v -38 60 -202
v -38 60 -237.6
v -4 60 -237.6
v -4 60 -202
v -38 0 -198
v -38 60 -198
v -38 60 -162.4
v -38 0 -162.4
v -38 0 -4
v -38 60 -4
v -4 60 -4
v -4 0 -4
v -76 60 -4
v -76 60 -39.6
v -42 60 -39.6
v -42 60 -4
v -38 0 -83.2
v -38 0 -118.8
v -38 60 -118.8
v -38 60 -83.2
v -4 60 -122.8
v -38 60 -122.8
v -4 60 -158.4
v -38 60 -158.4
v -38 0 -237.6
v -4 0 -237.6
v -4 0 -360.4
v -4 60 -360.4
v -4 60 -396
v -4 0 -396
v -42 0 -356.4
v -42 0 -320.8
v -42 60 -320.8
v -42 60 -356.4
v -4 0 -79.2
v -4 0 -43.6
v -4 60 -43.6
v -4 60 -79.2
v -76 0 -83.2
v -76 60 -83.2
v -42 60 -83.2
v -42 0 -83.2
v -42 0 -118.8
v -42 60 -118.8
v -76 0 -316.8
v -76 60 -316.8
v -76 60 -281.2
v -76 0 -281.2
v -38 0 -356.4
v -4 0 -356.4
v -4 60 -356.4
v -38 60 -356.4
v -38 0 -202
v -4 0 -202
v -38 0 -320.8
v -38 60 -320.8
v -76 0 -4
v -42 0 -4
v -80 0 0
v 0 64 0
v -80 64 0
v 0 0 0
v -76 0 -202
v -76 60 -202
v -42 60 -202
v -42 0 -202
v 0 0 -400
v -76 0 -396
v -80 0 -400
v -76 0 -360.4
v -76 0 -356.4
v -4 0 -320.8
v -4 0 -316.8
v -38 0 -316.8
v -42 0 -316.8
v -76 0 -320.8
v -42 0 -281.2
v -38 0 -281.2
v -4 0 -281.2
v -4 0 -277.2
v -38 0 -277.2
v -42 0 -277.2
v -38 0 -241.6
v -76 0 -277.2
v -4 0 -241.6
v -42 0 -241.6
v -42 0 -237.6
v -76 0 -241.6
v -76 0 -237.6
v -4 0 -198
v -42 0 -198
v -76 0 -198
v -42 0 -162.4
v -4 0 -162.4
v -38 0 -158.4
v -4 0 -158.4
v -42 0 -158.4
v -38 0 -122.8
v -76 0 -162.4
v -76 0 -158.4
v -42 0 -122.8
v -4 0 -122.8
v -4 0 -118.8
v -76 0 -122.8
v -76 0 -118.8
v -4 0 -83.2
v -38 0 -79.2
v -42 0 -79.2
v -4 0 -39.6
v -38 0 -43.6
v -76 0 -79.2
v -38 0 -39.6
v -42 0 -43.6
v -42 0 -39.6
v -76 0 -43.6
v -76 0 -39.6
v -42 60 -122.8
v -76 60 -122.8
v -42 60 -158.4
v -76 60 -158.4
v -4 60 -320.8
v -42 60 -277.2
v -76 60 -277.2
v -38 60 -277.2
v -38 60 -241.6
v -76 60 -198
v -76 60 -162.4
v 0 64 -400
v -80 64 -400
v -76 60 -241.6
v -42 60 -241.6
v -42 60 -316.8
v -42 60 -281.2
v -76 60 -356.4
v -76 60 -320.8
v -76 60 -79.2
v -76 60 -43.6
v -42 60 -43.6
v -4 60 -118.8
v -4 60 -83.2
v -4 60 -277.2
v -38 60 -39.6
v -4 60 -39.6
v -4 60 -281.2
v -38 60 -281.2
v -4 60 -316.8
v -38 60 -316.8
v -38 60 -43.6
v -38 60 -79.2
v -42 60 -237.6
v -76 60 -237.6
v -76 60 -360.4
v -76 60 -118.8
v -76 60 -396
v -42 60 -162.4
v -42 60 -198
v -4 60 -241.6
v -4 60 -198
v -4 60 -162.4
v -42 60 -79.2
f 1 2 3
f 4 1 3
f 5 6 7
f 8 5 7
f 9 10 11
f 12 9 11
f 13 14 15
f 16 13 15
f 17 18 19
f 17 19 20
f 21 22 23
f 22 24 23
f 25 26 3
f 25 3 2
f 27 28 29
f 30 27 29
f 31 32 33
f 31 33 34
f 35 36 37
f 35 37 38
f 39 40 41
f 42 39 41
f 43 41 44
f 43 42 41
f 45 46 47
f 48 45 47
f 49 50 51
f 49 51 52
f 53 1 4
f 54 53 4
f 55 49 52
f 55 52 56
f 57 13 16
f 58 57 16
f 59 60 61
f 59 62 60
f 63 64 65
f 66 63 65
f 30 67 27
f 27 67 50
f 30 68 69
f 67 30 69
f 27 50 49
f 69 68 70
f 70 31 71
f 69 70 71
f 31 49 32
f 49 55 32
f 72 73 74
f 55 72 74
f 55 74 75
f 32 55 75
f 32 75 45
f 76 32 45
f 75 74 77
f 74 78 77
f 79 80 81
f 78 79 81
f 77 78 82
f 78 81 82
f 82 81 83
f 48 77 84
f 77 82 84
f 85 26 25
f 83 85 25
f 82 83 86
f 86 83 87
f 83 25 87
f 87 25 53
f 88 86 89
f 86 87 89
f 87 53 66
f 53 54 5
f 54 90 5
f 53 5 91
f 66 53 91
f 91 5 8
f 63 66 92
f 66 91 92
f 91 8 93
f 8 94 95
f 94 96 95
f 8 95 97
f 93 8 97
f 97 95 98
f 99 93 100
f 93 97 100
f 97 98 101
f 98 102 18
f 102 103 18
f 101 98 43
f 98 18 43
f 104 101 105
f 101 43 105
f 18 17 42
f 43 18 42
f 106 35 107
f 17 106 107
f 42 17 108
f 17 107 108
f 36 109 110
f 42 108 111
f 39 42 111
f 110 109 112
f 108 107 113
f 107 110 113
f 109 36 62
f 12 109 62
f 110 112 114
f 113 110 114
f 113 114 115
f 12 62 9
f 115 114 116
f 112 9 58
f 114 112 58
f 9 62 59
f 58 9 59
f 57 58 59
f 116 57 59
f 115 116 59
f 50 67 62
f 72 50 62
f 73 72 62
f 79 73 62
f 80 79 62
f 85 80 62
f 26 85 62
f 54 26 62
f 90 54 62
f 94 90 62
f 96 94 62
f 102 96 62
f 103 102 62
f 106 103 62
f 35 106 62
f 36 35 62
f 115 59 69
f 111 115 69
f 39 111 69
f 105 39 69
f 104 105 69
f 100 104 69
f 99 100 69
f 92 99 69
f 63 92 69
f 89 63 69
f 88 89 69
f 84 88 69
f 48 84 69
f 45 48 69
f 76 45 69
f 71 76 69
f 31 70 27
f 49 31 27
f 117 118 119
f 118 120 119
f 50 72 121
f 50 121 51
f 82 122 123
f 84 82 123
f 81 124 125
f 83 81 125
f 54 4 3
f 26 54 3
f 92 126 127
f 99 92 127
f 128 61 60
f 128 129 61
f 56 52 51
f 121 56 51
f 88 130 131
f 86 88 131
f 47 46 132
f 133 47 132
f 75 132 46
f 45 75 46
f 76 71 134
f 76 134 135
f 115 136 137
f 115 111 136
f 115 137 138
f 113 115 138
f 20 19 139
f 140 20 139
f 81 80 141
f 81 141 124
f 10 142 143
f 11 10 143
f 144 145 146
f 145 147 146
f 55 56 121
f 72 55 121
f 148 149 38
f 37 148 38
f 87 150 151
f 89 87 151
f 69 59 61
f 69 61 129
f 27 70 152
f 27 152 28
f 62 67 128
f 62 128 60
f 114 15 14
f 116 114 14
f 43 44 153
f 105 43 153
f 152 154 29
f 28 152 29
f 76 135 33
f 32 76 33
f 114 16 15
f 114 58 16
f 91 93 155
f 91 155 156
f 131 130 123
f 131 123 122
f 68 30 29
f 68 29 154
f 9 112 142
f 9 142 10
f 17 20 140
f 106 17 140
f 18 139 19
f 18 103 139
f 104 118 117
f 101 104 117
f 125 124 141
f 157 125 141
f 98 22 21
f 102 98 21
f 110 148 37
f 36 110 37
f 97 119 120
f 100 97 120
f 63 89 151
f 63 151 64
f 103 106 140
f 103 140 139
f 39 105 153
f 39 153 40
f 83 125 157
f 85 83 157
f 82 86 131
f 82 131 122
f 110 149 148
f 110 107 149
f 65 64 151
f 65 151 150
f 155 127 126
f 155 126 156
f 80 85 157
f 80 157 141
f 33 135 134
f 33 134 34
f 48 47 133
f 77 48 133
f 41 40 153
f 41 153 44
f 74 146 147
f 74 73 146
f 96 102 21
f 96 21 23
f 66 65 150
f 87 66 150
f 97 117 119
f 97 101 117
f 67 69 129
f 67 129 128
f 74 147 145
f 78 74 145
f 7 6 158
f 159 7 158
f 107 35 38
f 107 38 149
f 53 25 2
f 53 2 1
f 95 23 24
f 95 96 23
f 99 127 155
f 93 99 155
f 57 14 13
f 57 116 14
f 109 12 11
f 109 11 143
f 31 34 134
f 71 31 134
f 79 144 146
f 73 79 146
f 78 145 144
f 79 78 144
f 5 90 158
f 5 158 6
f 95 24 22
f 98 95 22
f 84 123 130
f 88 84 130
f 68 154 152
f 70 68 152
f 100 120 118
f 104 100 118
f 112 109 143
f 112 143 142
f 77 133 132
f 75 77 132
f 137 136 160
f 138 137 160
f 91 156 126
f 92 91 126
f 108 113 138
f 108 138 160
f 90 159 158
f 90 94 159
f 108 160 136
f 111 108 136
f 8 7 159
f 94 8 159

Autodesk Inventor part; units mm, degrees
ref_plane "YZ Plane" through (0, 0, 0) normal (1, 0, 0) x (0, 1, 0)
ref_plane "XZ Plane" through (0, 0, 0) normal (0, 1, 0) x (-1, 0, 0)
ref_plane "XY Plane" through (0, 0, 0) normal (0, 0, 1) x (1, 0, 0)
sketch "Sketch1" plane through (0, 0, 0) normal (0, 1, 0) x (-1, 0, 0)
  line L0 (0, 0) -> (80, 0)
  line L1 (80, 0) -> (80, -400)
  line L2 (80, -400) -> (0, -400)
  line L3 (0, -400) -> (0, 0)
  line L4 (76, -4) -> (42, -4)
  line L5 (42, -4) -> (42, -39.6)
  line L6 (42, -39.6) -> (76, -39.6)
  line L7 (76, -39.6) -> (76, -4)
  line L8 (76, -43.6) -> (42, -43.6)
  line L9 (42, -43.6) -> (42, -79.2)
  line L10 (42, -79.2) -> (76, -79.2)
  line L11 (76, -79.2) -> (76, -43.6)
  line L12 (76, -83.2) -> (42, -83.2)
  line L13 (42, -83.2) -> (42, -118.8)
  line L14 (42, -118.8) -> (76, -118.8)
  line L15 (76, -118.8) -> (76, -83.2)
  line L16 (76, -122.8) -> (42, -122.8)
  line L17 (42, -122.8) -> (42, -158.4)
  line L18 (42, -158.4) -> (76, -158.4)
  line L19 (76, -158.4) -> (76, -122.8)
  line L20 (76, -162.4) -> (42, -162.4)
  line L21 (42, -162.4) -> (42, -198)
  line L22 (42, -198) -> (76, -198)
  line L23 (76, -198) -> (76, -162.4)
  line L24 (76, -202) -> (42, -202)
  line L25 (42, -202) -> (42, -237.6)
  line L26 (42, -237.6) -> (76, -237.6)
  line L27 (76, -237.6) -> (76, -202)
  line L28 (76, -241.6) -> (42, -241.6)
  line L29 (42, -241.6) -> (42, -277.2)
  line L30 (42, -277.2) -> (76, -277.2)
  line L31 (76, -277.2) -> (76, -241.6)
  line L32 (76, -281.2) -> (42, -281.2)
  line L33 (42, -281.2) -> (42, -316.8)
  line L34 (42, -316.8) -> (76, -316.8)
  line L35 (76, -316.8) -> (76, -281.2)
  line L36 (76, -320.8) -> (42, -320.8)
  line L37 (42, -320.8) -> (42, -356.4)
  line L38 (42, -356.4) -> (76, -356.4)
  line L39 (76, -356.4) -> (76, -320.8)
  line L40 (38, -4) -> (4, -4)
  line L41 (4, -4) -> (4, -39.6)
  line L42 (4, -39.6) -> (38, -39.6)
  line L43 (38, -39.6) -> (38, -4)
  line L44 (38, -43.6) -> (4, -43.6)
  line L45 (4, -43.6) -> (4, -79.2)
  line L46 (4, -79.2) -> (38, -79.2)
  line L47 (38, -79.2) -> (38, -43.6)
  line L48 (38, -83.2) -> (4, -83.2)
  line L49 (4, -83.2) -> (4, -118.8)
  line L50 (4, -118.8) -> (38, -118.8)
  line L51 (38, -118.8) -> (38, -83.2)
  line L52 (38, -122.8) -> (4, -122.8)
  line L53 (4, -122.8) -> (4, -158.4)
  line L54 (4, -158.4) -> (38, -158.4)
  line L55 (38, -158.4) -> (38, -122.8)
  line L56 (38, -162.4) -> (4, -162.4)
  line L57 (4, -162.4) -> (4, -198)
  line L58 (4, -198) -> (38, -198)
  line L59 (38, -198) -> (38, -162.4)
  line L60 (38, -202) -> (4, -202)
  line L61 (4, -202) -> (4, -237.6)
  line L62 (4, -237.6) -> (38, -237.6)
  line L63 (38, -237.6) -> (38, -202)
  line L64 (38, -241.6) -> (4, -241.6)
  line L65 (4, -241.6) -> (4, -277.2)
  line L66 (4, -277.2) -> (38, -277.2)
  line L67 (38, -277.2) -> (38, -241.6)
  line L68 (38, -281.2) -> (4, -281.2)
  line L69 (4, -281.2) -> (4, -316.8)
  line L70 (4, -316.8) -> (38, -316.8)
  line L71 (38, -316.8) -> (38, -281.2)
  line L72 (38, -320.8) -> (4, -320.8)
  line L73 (4, -320.8) -> (4, -356.4)
  line L74 (4, -356.4) -> (38, -356.4)
  line L75 (38, -356.4) -> (38, -320.8)
  line L76 (76, -360.4) -> (4, -360.4)
  line L77 (4, -360.4) -> (4, -396)
  line L78 (4, -396) -> (76, -396)
  line L79 (76, -396) -> (76, -360.4)
  dimension "d0" = 80
  dimension "d1" = 400
  dimension "d2" = 4
  dimension "d3" = 4
  dimension "d4" = 34
  dimension "d5" = 35.6
  dimension "d8" = 39.6
  dimension "d11" = 38
  dimension "d14" = 4
  dimension "d15" = 4
  dimension "d16" = 4
  dimension "d17" = 4
extrude "Extrusion1" add sketch "Sketch1" along normal blind 60
sketch "Sketch2" plane through (0, 60, 0) normal (0, 1, 0) x (1, 0, 0)
  line L0 (-80, 0) -> (0, 0) projected
  line L1 (0, 400) -> (-80, 400) projected
  line L2 (-80, 0) -> (0, 0)
  line L3 (0, 0) -> (0, 400)
  line L4 (0, 400) -> (-80, 400)
  line L5 (-80, 400) -> (-80, 0)
extrude "Extrusion2" add sketch "Sketch2" along normal blind 4
properties part number "Contenedor Sólido" material "ABS Plastic"
